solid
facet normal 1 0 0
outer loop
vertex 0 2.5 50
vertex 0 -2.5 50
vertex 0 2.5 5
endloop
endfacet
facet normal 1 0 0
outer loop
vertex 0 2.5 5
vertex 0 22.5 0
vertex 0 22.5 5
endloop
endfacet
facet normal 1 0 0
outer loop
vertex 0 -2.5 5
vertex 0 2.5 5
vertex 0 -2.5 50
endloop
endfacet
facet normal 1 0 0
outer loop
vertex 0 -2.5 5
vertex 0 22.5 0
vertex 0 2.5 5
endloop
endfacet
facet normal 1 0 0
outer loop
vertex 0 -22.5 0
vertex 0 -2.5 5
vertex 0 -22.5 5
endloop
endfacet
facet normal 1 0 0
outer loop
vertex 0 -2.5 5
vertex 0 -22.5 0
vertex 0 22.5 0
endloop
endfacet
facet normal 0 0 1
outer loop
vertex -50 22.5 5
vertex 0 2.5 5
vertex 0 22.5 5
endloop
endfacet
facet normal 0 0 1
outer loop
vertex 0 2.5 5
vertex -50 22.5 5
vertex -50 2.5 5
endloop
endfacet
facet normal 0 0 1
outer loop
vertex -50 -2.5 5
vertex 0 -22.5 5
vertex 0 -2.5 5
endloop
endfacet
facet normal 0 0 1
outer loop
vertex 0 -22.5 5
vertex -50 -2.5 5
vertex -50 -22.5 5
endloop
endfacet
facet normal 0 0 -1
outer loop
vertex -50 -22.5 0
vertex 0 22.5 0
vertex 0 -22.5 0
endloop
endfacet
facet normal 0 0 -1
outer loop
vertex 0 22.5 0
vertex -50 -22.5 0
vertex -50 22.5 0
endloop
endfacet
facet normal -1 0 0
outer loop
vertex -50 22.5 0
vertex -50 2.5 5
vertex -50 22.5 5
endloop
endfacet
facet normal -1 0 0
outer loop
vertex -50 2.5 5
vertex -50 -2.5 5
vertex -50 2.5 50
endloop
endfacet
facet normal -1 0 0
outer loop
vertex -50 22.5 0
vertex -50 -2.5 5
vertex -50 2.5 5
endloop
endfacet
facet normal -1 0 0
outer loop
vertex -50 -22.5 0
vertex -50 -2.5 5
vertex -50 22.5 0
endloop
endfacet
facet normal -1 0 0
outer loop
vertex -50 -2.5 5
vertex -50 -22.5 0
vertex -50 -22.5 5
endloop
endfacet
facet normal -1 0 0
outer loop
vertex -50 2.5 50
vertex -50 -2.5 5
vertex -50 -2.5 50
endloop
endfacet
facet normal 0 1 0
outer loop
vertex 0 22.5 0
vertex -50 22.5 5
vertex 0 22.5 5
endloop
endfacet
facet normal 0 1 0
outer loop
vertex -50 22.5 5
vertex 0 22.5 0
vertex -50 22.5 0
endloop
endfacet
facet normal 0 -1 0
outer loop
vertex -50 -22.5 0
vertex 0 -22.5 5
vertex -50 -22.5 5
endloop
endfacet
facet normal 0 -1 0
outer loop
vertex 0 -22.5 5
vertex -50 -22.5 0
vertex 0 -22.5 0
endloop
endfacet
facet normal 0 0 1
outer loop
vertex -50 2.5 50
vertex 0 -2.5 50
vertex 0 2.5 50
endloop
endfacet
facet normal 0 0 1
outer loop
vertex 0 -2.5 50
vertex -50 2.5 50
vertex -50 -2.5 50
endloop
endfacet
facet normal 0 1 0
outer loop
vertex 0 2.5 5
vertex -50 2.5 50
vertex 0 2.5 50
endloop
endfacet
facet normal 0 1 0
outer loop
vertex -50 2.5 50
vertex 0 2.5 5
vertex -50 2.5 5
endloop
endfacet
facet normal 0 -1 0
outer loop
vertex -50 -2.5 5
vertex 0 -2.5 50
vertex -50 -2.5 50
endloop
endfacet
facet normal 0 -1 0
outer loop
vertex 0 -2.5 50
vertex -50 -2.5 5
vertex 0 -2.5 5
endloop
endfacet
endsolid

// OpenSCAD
// Built by bench/smallmodels/features/compiler.py from a list of features.
$fn = 64;
difference() {
  union() {
    translate([-25, 0, 0]) translate([-25, -22.5, 0]) cube([50, 45, 5]);
    translate([-25, 0, 0]) translate([-25, -2.5, 0]) cube([50, 5, 50]);
  }
  union() {
    translate([-17, 30, 30]) rotate([0, 0, 0]) rotate([0, 90, 0]) cylinder(d = 4.5, h = 1200, center = true);
    translate([17, 30, 30]) rotate([0, 0, 0]) rotate([0, 90, 0]) cylinder(d = 4.5, h = 1200, center = true);
  }
}
